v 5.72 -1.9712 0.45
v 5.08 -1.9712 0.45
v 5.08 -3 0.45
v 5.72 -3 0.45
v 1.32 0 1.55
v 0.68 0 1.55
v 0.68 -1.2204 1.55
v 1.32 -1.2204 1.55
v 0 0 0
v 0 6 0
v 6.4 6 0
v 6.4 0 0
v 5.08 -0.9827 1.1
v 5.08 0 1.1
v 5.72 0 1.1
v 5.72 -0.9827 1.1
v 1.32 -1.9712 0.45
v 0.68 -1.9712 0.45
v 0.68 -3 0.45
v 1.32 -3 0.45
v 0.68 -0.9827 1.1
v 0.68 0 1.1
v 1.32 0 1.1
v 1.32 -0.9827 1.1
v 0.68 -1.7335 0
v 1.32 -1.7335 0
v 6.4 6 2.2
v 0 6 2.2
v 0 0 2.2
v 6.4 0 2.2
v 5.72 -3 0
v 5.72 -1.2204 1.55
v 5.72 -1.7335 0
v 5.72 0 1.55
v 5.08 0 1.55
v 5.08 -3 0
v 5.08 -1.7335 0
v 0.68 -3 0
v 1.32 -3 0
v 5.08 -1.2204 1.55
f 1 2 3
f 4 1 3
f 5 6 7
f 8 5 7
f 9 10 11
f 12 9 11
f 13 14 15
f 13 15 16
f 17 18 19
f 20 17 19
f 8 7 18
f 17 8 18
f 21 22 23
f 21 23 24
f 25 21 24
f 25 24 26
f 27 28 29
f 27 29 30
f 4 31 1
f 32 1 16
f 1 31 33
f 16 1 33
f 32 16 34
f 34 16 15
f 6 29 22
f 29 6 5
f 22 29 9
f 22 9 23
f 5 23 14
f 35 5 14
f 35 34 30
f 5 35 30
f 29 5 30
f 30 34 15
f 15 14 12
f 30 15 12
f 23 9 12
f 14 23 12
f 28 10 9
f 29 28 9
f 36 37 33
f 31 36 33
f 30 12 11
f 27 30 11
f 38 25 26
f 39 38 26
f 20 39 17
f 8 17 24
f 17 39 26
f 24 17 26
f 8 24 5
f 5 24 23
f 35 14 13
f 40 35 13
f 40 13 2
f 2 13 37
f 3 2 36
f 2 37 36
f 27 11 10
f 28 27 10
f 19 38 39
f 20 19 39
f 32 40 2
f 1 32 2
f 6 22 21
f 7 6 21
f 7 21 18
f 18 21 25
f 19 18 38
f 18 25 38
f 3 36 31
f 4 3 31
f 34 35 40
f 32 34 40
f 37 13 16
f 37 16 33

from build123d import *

# Parameters (mm, degrees)
EXTRUSION1_DEPTH        = 2.2
ENL_V_MAT_EXTRU_1_DEPTH = 9.576619381


with BuildPart() as part:
    # Esquisse1 → Extrusion1 (new body)
    with BuildSketch(Plane.XY):
        Polygon((0, 0), (0.68, 0), (0.68, -3), (1.32, -3), (1.32, 0), (5.08, 0), (5.08, -3), (5.72, -3), (5.72, 0), (6.4, 0), (6.4, 6), (0, 6), align=None)
    extrude(amount=EXTRUSION1_DEPTH)

    # Esquisse2 → Enlèv. mat.-Extru.1 (cut, through all)
    with BuildSketch(Plane.ZY.offset(-0.68)):
        Polygon((0.45, -1.971195231), (0.45, -3.327188137), (4.113583834, -3.327188137), (4.113583834, 0), (1.55, 0), (1.55, -1.220350349), align=None)
        Polygon((0, -1.733519979), (0, -3.327188137), (-1.233682365, -3.327188137), (-1.233682365, 0), (1.1, 0), (1.1, -0.982675097), align=None)
    extrude(amount=-ENL_V_MAT_EXTRU_1_DEPTH, mode=Mode.SUBTRACT)


solid = part.part
